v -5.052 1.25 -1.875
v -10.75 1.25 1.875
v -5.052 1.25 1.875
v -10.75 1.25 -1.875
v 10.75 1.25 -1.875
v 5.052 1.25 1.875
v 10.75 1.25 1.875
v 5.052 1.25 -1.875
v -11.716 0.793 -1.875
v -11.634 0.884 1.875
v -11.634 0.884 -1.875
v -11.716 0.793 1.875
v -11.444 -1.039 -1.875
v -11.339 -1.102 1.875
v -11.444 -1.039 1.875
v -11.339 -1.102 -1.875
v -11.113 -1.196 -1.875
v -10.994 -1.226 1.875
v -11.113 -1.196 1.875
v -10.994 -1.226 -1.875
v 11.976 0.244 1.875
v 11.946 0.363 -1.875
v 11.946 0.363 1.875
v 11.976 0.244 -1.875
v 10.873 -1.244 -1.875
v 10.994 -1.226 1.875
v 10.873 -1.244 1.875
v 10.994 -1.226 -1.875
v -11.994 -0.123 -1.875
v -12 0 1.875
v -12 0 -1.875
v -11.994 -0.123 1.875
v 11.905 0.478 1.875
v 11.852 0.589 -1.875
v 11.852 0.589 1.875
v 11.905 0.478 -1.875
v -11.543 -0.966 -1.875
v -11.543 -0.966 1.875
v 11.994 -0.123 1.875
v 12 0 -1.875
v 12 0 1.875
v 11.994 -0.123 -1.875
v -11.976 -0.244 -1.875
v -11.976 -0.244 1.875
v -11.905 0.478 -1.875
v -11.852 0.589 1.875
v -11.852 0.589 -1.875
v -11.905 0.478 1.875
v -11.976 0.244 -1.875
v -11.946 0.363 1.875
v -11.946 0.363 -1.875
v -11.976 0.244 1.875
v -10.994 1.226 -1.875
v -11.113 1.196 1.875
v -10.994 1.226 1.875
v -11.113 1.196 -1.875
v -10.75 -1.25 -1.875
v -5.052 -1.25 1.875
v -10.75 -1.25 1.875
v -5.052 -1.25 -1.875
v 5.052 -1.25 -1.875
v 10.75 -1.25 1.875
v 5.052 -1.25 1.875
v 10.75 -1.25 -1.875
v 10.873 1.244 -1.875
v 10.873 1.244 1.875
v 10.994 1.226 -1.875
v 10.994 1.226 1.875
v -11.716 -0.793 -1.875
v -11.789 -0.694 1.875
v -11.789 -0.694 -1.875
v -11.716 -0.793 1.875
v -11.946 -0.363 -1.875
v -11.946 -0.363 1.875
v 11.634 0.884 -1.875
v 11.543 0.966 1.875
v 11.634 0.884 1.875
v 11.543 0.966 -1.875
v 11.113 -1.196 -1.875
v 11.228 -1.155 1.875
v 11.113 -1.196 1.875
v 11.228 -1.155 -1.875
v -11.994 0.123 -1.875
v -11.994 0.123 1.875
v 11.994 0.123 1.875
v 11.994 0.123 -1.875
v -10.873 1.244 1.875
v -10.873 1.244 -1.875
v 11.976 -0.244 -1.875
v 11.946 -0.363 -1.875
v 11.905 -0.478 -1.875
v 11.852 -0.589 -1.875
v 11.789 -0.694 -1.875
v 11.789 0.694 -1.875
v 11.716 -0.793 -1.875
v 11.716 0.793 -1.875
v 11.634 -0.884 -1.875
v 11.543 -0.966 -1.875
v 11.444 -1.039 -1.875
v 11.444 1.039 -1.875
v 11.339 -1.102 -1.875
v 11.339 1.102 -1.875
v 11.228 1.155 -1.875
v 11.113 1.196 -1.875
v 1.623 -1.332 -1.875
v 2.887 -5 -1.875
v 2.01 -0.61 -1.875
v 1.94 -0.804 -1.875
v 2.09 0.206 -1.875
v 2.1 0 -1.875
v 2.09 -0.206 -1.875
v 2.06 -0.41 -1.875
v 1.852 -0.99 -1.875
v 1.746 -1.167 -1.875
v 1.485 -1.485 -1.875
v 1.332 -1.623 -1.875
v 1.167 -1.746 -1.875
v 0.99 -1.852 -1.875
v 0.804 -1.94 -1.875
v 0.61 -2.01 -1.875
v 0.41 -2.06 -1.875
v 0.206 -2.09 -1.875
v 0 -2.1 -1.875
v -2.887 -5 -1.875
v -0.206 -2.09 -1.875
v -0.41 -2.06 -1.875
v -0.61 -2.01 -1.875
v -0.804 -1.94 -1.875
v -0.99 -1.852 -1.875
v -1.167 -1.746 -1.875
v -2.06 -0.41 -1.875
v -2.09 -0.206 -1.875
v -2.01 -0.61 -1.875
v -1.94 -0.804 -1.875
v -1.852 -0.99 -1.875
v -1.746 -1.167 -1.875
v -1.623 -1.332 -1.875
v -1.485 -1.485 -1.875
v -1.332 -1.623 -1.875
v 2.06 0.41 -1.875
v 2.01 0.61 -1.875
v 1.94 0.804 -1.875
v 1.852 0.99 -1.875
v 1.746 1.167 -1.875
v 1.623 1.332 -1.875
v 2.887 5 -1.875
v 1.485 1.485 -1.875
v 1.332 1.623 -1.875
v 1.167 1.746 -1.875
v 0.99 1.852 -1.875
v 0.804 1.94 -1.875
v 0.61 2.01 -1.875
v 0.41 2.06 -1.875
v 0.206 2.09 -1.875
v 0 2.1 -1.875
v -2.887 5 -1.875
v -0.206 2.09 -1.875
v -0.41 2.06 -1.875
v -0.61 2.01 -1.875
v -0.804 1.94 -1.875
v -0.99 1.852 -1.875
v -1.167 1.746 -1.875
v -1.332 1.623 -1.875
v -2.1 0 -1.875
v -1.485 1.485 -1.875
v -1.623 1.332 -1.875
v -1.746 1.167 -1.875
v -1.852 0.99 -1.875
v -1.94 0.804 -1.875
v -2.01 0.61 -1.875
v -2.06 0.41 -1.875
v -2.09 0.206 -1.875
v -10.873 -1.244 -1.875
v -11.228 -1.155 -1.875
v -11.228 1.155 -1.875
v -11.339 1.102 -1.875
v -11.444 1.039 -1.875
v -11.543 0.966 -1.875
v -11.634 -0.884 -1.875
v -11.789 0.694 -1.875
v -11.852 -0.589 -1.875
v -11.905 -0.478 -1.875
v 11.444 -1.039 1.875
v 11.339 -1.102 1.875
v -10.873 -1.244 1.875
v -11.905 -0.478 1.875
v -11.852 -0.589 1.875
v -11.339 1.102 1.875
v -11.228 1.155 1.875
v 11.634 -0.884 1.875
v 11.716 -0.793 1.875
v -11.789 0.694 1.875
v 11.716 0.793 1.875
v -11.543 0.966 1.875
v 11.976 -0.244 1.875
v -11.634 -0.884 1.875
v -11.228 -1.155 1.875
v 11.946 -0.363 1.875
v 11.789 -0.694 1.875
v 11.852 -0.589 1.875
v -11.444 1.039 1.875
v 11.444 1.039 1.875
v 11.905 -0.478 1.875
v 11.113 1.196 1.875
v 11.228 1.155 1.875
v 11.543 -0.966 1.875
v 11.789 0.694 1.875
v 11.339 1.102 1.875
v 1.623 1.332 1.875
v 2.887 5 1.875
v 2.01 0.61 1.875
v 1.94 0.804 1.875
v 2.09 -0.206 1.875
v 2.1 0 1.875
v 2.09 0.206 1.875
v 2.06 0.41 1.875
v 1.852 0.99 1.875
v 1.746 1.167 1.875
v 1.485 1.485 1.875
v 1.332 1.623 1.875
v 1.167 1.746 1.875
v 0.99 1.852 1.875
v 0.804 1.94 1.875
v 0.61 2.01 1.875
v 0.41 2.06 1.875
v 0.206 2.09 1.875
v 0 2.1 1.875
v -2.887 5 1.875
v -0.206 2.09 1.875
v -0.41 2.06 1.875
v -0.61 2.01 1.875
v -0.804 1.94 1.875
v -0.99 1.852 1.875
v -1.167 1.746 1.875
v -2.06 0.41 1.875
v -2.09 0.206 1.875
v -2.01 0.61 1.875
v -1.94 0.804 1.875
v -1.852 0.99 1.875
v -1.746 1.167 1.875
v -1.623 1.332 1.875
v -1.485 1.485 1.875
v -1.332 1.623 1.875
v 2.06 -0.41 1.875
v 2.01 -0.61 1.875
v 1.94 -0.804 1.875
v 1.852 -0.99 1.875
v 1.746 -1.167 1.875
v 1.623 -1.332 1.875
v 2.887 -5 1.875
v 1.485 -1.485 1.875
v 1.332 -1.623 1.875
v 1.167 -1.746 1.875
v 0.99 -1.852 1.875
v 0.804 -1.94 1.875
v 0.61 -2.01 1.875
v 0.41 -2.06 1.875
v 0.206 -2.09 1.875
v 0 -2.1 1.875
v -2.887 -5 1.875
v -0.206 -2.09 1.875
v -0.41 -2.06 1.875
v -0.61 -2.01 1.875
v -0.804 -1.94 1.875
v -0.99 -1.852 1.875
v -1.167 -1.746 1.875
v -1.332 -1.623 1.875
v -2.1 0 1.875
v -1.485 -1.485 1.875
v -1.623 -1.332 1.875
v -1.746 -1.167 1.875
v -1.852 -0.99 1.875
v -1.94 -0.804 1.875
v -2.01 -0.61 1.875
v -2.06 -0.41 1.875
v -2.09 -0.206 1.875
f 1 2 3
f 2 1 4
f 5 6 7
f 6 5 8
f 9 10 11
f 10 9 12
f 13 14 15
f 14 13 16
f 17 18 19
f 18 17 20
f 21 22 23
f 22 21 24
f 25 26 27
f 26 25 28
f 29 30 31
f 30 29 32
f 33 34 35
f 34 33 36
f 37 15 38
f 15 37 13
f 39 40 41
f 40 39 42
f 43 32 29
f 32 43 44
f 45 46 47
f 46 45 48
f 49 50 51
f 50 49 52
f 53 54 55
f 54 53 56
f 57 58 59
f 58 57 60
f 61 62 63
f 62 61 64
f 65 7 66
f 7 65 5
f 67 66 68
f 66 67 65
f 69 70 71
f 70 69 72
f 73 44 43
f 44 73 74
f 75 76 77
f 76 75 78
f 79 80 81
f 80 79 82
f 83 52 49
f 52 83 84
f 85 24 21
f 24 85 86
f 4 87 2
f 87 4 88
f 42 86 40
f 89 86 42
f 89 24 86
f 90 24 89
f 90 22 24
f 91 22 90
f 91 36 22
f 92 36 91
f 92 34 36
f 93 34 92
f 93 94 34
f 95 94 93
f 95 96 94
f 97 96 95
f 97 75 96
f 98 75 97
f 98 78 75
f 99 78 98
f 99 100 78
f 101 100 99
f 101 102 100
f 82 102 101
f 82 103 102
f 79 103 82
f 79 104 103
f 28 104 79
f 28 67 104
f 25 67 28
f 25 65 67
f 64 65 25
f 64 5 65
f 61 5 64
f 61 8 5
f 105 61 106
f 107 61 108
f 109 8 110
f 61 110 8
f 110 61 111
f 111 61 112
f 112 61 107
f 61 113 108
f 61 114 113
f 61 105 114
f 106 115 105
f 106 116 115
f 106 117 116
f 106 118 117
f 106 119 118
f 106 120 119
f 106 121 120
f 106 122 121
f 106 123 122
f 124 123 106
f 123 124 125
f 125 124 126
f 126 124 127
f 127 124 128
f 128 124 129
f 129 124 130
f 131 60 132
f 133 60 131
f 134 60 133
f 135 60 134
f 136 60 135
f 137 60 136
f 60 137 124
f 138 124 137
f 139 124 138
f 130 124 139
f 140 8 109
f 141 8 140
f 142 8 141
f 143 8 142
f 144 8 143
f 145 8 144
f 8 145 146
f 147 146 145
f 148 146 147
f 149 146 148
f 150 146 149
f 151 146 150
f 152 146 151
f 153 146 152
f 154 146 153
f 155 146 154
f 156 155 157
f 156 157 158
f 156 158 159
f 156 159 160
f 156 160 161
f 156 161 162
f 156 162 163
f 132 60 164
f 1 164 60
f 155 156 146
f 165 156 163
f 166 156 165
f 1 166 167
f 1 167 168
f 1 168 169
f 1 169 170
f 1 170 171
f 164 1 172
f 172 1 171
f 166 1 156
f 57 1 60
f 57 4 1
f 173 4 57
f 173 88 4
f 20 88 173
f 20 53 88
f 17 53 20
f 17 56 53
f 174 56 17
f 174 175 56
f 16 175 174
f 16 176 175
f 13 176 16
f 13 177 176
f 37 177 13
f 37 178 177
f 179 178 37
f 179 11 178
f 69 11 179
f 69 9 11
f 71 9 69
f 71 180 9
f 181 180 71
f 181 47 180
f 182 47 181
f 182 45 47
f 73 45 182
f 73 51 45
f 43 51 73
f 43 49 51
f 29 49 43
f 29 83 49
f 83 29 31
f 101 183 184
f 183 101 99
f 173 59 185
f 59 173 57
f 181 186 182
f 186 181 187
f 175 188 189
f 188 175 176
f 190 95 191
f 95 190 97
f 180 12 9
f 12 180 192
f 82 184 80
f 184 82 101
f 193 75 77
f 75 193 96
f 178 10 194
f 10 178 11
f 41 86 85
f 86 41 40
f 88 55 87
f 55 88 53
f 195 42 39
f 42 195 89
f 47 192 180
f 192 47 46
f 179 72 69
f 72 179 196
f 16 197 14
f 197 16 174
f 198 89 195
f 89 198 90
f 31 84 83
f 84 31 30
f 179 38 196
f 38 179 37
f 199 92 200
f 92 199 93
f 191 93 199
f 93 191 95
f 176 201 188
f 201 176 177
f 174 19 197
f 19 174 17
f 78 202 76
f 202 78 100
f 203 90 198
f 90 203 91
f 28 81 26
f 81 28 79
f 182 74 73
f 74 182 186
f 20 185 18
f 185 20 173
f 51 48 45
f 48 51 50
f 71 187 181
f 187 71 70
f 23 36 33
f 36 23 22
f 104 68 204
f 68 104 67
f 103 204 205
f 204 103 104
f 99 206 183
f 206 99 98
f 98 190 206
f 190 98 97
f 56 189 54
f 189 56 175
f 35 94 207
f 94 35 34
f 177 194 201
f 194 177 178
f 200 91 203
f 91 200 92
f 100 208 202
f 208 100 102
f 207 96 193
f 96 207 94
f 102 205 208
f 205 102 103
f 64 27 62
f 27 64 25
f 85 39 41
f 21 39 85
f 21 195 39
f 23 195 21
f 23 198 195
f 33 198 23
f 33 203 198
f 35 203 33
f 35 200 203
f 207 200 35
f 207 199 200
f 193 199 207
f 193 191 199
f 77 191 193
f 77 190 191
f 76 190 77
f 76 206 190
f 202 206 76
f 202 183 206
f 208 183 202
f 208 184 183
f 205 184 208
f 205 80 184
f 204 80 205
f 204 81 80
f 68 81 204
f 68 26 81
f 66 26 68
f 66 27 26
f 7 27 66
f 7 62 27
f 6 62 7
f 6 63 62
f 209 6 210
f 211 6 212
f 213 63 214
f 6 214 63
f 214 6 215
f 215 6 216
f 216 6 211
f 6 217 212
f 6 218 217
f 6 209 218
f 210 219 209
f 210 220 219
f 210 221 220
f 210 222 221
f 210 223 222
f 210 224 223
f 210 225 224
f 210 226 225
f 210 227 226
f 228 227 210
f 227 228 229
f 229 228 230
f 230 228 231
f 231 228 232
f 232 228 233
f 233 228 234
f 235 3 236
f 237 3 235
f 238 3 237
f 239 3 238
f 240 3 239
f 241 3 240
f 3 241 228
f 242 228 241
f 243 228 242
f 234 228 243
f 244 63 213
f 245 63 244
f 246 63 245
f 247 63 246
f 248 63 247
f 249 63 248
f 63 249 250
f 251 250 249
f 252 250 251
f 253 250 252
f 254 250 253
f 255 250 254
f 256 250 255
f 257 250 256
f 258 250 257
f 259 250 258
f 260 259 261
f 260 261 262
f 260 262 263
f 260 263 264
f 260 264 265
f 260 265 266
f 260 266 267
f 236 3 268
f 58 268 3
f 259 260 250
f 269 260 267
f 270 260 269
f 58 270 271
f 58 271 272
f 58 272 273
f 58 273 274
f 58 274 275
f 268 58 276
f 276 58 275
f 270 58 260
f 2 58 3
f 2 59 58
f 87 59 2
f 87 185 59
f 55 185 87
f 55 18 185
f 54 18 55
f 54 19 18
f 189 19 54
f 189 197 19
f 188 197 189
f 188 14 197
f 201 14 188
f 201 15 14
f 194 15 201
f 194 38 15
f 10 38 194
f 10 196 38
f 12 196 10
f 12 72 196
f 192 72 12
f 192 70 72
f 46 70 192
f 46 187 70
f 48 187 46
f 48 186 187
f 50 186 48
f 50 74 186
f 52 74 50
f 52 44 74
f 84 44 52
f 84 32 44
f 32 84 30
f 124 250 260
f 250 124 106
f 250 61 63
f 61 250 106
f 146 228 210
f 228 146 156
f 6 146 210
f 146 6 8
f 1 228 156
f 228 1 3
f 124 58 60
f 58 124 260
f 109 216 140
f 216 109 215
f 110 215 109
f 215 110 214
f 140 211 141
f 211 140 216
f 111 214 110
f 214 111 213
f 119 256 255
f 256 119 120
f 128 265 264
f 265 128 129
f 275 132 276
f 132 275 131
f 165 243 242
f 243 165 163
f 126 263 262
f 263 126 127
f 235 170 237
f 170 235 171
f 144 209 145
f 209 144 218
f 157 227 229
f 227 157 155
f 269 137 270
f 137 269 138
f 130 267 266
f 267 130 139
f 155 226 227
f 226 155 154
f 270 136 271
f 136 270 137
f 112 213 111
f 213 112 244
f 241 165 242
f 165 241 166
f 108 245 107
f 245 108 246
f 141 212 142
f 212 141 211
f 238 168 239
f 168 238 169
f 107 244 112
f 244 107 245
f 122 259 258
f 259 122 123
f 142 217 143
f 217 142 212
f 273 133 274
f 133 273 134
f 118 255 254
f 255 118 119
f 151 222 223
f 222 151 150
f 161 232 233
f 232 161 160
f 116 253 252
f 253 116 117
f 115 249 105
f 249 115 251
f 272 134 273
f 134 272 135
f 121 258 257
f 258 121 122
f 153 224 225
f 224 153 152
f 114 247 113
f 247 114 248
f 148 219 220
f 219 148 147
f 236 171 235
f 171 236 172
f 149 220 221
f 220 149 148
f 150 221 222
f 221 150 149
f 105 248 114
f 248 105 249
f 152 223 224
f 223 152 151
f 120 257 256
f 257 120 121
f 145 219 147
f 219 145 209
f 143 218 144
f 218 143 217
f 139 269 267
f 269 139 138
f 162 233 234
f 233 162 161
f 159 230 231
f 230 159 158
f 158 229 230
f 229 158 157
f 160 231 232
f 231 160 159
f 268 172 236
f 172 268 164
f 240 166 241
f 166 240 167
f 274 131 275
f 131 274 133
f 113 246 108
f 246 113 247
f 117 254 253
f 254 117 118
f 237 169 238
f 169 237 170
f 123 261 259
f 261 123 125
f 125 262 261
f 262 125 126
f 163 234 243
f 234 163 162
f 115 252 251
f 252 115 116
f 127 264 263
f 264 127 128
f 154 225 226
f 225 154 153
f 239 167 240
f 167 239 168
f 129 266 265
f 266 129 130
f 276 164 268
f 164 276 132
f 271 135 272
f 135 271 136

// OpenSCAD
// Wing nut for M4 screw: 10.0mm across flats, 3.75mm thick
// One connected solid with two wings and a centered clearance hole

// Parameters
thread_diameter_mm = 4.0;          // M4 nominal
across_flats_mm    = 10.0;         // hex across flats
thickness_mm       = 3.75;         // overall thickness (Z)

wing_span_mm       = 24.0;         // tip-to-tip span (X)
wing_thickness_mm  = 2.5;          // wing width (Y)
wing_tip_radius_mm = 2.0;          // rounded wing tip radius
fillet_radius_mm   = 1.0;          // blend at wing root

thread_clearance_mm = 0.2;         // clearance for M4
overlap_mm          = 0.6;         // overlap to guarantee connectivity
eps_mm              = 0.2;

$fn = 64;

// Derived
hex_circumradius_mm = across_flats_mm / sqrt(3); // for $fn=6 cylinder
hole_r_mm = (thread_diameter_mm + thread_clearance_mm) / 2;

// 2D rounded-rectangle (capsule) centered at origin, length along X, width along Y
module capsule2d(len_x, wid_y, r) {
    r2 = min(r, wid_y/2, len_x/2);
    hull() {
        translate([ len_x/2 - r2, 0]) circle(r=r2);
        translate([-len_x/2 + r2, 0]) circle(r=r2);
    }
}

// Hex core
module hex_core() {
    cylinder(r=hex_circumradius_mm, h=thickness_mm, center=true, $fn=6);
}

// Two wings (planform in XY, extruded in Z)
module wings() {
    // Ensure wings connect to hex by overlapping into it
    // Root-to-root length equals across_flats, plus overlap on both sides
    wing_len_x = wing_span_mm;
    linear_extrude(height=thickness_mm, center=true)
        difference() {
            capsule2d(wing_len_x, wing_thickness_mm, wing_tip_radius_mm);
            // Optional slight waist near center to avoid "bar through hex" look:
            // remove a small rectangle around center, but keep overlap into hex
            // (commented out to keep robust connectivity)
            // square([across_flats_mm - 2*overlap_mm, wing_thickness_mm*0.6], center=true);
        }
}

// Root fillets to soften transition (small cylinders blended via hull)
module wing_root_blends() {
    // Place blend features at the hex sides along X
    root_x = across_flats_mm/2 - overlap_mm;
    for (sx = [-1, 1]) {
        translate([sx*root_x, 0, 0])
            cylinder(r=fillet_radius_mm, h=thickness_mm, center=true, $fn=48);
    }
}

// Final wing nut
module wing_nut() {
    difference() {
        union() {
            hex_core();
            // Wings are a separate feature (two wings), not a through-handle:
            // Use intersection to keep wings within thickness and avoid stray geometry.
            intersection() {
                wings();
                // Limit wings to a band around the mid-plane in Y so they read as wings
                // while still being one connected solid.
                translate([0, 0, 0])
                    cube([wing_span_mm + 2*eps_mm, wing_thickness_mm + 2*eps_mm, thickness_mm + 2*eps_mm], center=true);
            }
            // Add small blends at the roots for a more wing-nut-like transition
            hull() {
                wing_root_blends();
                // Overlap into hex to guarantee connection
                cylinder(r=hex_circumradius_mm - 0.2, h=thickness_mm, center=true, $fn=6);
            }
        }

        // Center hole (clearance for M4)
        cylinder(r=hole_r_mm, h=thickness_mm + 2*eps_mm, center=true, $fn=64);
    }
}

wing_nut();
